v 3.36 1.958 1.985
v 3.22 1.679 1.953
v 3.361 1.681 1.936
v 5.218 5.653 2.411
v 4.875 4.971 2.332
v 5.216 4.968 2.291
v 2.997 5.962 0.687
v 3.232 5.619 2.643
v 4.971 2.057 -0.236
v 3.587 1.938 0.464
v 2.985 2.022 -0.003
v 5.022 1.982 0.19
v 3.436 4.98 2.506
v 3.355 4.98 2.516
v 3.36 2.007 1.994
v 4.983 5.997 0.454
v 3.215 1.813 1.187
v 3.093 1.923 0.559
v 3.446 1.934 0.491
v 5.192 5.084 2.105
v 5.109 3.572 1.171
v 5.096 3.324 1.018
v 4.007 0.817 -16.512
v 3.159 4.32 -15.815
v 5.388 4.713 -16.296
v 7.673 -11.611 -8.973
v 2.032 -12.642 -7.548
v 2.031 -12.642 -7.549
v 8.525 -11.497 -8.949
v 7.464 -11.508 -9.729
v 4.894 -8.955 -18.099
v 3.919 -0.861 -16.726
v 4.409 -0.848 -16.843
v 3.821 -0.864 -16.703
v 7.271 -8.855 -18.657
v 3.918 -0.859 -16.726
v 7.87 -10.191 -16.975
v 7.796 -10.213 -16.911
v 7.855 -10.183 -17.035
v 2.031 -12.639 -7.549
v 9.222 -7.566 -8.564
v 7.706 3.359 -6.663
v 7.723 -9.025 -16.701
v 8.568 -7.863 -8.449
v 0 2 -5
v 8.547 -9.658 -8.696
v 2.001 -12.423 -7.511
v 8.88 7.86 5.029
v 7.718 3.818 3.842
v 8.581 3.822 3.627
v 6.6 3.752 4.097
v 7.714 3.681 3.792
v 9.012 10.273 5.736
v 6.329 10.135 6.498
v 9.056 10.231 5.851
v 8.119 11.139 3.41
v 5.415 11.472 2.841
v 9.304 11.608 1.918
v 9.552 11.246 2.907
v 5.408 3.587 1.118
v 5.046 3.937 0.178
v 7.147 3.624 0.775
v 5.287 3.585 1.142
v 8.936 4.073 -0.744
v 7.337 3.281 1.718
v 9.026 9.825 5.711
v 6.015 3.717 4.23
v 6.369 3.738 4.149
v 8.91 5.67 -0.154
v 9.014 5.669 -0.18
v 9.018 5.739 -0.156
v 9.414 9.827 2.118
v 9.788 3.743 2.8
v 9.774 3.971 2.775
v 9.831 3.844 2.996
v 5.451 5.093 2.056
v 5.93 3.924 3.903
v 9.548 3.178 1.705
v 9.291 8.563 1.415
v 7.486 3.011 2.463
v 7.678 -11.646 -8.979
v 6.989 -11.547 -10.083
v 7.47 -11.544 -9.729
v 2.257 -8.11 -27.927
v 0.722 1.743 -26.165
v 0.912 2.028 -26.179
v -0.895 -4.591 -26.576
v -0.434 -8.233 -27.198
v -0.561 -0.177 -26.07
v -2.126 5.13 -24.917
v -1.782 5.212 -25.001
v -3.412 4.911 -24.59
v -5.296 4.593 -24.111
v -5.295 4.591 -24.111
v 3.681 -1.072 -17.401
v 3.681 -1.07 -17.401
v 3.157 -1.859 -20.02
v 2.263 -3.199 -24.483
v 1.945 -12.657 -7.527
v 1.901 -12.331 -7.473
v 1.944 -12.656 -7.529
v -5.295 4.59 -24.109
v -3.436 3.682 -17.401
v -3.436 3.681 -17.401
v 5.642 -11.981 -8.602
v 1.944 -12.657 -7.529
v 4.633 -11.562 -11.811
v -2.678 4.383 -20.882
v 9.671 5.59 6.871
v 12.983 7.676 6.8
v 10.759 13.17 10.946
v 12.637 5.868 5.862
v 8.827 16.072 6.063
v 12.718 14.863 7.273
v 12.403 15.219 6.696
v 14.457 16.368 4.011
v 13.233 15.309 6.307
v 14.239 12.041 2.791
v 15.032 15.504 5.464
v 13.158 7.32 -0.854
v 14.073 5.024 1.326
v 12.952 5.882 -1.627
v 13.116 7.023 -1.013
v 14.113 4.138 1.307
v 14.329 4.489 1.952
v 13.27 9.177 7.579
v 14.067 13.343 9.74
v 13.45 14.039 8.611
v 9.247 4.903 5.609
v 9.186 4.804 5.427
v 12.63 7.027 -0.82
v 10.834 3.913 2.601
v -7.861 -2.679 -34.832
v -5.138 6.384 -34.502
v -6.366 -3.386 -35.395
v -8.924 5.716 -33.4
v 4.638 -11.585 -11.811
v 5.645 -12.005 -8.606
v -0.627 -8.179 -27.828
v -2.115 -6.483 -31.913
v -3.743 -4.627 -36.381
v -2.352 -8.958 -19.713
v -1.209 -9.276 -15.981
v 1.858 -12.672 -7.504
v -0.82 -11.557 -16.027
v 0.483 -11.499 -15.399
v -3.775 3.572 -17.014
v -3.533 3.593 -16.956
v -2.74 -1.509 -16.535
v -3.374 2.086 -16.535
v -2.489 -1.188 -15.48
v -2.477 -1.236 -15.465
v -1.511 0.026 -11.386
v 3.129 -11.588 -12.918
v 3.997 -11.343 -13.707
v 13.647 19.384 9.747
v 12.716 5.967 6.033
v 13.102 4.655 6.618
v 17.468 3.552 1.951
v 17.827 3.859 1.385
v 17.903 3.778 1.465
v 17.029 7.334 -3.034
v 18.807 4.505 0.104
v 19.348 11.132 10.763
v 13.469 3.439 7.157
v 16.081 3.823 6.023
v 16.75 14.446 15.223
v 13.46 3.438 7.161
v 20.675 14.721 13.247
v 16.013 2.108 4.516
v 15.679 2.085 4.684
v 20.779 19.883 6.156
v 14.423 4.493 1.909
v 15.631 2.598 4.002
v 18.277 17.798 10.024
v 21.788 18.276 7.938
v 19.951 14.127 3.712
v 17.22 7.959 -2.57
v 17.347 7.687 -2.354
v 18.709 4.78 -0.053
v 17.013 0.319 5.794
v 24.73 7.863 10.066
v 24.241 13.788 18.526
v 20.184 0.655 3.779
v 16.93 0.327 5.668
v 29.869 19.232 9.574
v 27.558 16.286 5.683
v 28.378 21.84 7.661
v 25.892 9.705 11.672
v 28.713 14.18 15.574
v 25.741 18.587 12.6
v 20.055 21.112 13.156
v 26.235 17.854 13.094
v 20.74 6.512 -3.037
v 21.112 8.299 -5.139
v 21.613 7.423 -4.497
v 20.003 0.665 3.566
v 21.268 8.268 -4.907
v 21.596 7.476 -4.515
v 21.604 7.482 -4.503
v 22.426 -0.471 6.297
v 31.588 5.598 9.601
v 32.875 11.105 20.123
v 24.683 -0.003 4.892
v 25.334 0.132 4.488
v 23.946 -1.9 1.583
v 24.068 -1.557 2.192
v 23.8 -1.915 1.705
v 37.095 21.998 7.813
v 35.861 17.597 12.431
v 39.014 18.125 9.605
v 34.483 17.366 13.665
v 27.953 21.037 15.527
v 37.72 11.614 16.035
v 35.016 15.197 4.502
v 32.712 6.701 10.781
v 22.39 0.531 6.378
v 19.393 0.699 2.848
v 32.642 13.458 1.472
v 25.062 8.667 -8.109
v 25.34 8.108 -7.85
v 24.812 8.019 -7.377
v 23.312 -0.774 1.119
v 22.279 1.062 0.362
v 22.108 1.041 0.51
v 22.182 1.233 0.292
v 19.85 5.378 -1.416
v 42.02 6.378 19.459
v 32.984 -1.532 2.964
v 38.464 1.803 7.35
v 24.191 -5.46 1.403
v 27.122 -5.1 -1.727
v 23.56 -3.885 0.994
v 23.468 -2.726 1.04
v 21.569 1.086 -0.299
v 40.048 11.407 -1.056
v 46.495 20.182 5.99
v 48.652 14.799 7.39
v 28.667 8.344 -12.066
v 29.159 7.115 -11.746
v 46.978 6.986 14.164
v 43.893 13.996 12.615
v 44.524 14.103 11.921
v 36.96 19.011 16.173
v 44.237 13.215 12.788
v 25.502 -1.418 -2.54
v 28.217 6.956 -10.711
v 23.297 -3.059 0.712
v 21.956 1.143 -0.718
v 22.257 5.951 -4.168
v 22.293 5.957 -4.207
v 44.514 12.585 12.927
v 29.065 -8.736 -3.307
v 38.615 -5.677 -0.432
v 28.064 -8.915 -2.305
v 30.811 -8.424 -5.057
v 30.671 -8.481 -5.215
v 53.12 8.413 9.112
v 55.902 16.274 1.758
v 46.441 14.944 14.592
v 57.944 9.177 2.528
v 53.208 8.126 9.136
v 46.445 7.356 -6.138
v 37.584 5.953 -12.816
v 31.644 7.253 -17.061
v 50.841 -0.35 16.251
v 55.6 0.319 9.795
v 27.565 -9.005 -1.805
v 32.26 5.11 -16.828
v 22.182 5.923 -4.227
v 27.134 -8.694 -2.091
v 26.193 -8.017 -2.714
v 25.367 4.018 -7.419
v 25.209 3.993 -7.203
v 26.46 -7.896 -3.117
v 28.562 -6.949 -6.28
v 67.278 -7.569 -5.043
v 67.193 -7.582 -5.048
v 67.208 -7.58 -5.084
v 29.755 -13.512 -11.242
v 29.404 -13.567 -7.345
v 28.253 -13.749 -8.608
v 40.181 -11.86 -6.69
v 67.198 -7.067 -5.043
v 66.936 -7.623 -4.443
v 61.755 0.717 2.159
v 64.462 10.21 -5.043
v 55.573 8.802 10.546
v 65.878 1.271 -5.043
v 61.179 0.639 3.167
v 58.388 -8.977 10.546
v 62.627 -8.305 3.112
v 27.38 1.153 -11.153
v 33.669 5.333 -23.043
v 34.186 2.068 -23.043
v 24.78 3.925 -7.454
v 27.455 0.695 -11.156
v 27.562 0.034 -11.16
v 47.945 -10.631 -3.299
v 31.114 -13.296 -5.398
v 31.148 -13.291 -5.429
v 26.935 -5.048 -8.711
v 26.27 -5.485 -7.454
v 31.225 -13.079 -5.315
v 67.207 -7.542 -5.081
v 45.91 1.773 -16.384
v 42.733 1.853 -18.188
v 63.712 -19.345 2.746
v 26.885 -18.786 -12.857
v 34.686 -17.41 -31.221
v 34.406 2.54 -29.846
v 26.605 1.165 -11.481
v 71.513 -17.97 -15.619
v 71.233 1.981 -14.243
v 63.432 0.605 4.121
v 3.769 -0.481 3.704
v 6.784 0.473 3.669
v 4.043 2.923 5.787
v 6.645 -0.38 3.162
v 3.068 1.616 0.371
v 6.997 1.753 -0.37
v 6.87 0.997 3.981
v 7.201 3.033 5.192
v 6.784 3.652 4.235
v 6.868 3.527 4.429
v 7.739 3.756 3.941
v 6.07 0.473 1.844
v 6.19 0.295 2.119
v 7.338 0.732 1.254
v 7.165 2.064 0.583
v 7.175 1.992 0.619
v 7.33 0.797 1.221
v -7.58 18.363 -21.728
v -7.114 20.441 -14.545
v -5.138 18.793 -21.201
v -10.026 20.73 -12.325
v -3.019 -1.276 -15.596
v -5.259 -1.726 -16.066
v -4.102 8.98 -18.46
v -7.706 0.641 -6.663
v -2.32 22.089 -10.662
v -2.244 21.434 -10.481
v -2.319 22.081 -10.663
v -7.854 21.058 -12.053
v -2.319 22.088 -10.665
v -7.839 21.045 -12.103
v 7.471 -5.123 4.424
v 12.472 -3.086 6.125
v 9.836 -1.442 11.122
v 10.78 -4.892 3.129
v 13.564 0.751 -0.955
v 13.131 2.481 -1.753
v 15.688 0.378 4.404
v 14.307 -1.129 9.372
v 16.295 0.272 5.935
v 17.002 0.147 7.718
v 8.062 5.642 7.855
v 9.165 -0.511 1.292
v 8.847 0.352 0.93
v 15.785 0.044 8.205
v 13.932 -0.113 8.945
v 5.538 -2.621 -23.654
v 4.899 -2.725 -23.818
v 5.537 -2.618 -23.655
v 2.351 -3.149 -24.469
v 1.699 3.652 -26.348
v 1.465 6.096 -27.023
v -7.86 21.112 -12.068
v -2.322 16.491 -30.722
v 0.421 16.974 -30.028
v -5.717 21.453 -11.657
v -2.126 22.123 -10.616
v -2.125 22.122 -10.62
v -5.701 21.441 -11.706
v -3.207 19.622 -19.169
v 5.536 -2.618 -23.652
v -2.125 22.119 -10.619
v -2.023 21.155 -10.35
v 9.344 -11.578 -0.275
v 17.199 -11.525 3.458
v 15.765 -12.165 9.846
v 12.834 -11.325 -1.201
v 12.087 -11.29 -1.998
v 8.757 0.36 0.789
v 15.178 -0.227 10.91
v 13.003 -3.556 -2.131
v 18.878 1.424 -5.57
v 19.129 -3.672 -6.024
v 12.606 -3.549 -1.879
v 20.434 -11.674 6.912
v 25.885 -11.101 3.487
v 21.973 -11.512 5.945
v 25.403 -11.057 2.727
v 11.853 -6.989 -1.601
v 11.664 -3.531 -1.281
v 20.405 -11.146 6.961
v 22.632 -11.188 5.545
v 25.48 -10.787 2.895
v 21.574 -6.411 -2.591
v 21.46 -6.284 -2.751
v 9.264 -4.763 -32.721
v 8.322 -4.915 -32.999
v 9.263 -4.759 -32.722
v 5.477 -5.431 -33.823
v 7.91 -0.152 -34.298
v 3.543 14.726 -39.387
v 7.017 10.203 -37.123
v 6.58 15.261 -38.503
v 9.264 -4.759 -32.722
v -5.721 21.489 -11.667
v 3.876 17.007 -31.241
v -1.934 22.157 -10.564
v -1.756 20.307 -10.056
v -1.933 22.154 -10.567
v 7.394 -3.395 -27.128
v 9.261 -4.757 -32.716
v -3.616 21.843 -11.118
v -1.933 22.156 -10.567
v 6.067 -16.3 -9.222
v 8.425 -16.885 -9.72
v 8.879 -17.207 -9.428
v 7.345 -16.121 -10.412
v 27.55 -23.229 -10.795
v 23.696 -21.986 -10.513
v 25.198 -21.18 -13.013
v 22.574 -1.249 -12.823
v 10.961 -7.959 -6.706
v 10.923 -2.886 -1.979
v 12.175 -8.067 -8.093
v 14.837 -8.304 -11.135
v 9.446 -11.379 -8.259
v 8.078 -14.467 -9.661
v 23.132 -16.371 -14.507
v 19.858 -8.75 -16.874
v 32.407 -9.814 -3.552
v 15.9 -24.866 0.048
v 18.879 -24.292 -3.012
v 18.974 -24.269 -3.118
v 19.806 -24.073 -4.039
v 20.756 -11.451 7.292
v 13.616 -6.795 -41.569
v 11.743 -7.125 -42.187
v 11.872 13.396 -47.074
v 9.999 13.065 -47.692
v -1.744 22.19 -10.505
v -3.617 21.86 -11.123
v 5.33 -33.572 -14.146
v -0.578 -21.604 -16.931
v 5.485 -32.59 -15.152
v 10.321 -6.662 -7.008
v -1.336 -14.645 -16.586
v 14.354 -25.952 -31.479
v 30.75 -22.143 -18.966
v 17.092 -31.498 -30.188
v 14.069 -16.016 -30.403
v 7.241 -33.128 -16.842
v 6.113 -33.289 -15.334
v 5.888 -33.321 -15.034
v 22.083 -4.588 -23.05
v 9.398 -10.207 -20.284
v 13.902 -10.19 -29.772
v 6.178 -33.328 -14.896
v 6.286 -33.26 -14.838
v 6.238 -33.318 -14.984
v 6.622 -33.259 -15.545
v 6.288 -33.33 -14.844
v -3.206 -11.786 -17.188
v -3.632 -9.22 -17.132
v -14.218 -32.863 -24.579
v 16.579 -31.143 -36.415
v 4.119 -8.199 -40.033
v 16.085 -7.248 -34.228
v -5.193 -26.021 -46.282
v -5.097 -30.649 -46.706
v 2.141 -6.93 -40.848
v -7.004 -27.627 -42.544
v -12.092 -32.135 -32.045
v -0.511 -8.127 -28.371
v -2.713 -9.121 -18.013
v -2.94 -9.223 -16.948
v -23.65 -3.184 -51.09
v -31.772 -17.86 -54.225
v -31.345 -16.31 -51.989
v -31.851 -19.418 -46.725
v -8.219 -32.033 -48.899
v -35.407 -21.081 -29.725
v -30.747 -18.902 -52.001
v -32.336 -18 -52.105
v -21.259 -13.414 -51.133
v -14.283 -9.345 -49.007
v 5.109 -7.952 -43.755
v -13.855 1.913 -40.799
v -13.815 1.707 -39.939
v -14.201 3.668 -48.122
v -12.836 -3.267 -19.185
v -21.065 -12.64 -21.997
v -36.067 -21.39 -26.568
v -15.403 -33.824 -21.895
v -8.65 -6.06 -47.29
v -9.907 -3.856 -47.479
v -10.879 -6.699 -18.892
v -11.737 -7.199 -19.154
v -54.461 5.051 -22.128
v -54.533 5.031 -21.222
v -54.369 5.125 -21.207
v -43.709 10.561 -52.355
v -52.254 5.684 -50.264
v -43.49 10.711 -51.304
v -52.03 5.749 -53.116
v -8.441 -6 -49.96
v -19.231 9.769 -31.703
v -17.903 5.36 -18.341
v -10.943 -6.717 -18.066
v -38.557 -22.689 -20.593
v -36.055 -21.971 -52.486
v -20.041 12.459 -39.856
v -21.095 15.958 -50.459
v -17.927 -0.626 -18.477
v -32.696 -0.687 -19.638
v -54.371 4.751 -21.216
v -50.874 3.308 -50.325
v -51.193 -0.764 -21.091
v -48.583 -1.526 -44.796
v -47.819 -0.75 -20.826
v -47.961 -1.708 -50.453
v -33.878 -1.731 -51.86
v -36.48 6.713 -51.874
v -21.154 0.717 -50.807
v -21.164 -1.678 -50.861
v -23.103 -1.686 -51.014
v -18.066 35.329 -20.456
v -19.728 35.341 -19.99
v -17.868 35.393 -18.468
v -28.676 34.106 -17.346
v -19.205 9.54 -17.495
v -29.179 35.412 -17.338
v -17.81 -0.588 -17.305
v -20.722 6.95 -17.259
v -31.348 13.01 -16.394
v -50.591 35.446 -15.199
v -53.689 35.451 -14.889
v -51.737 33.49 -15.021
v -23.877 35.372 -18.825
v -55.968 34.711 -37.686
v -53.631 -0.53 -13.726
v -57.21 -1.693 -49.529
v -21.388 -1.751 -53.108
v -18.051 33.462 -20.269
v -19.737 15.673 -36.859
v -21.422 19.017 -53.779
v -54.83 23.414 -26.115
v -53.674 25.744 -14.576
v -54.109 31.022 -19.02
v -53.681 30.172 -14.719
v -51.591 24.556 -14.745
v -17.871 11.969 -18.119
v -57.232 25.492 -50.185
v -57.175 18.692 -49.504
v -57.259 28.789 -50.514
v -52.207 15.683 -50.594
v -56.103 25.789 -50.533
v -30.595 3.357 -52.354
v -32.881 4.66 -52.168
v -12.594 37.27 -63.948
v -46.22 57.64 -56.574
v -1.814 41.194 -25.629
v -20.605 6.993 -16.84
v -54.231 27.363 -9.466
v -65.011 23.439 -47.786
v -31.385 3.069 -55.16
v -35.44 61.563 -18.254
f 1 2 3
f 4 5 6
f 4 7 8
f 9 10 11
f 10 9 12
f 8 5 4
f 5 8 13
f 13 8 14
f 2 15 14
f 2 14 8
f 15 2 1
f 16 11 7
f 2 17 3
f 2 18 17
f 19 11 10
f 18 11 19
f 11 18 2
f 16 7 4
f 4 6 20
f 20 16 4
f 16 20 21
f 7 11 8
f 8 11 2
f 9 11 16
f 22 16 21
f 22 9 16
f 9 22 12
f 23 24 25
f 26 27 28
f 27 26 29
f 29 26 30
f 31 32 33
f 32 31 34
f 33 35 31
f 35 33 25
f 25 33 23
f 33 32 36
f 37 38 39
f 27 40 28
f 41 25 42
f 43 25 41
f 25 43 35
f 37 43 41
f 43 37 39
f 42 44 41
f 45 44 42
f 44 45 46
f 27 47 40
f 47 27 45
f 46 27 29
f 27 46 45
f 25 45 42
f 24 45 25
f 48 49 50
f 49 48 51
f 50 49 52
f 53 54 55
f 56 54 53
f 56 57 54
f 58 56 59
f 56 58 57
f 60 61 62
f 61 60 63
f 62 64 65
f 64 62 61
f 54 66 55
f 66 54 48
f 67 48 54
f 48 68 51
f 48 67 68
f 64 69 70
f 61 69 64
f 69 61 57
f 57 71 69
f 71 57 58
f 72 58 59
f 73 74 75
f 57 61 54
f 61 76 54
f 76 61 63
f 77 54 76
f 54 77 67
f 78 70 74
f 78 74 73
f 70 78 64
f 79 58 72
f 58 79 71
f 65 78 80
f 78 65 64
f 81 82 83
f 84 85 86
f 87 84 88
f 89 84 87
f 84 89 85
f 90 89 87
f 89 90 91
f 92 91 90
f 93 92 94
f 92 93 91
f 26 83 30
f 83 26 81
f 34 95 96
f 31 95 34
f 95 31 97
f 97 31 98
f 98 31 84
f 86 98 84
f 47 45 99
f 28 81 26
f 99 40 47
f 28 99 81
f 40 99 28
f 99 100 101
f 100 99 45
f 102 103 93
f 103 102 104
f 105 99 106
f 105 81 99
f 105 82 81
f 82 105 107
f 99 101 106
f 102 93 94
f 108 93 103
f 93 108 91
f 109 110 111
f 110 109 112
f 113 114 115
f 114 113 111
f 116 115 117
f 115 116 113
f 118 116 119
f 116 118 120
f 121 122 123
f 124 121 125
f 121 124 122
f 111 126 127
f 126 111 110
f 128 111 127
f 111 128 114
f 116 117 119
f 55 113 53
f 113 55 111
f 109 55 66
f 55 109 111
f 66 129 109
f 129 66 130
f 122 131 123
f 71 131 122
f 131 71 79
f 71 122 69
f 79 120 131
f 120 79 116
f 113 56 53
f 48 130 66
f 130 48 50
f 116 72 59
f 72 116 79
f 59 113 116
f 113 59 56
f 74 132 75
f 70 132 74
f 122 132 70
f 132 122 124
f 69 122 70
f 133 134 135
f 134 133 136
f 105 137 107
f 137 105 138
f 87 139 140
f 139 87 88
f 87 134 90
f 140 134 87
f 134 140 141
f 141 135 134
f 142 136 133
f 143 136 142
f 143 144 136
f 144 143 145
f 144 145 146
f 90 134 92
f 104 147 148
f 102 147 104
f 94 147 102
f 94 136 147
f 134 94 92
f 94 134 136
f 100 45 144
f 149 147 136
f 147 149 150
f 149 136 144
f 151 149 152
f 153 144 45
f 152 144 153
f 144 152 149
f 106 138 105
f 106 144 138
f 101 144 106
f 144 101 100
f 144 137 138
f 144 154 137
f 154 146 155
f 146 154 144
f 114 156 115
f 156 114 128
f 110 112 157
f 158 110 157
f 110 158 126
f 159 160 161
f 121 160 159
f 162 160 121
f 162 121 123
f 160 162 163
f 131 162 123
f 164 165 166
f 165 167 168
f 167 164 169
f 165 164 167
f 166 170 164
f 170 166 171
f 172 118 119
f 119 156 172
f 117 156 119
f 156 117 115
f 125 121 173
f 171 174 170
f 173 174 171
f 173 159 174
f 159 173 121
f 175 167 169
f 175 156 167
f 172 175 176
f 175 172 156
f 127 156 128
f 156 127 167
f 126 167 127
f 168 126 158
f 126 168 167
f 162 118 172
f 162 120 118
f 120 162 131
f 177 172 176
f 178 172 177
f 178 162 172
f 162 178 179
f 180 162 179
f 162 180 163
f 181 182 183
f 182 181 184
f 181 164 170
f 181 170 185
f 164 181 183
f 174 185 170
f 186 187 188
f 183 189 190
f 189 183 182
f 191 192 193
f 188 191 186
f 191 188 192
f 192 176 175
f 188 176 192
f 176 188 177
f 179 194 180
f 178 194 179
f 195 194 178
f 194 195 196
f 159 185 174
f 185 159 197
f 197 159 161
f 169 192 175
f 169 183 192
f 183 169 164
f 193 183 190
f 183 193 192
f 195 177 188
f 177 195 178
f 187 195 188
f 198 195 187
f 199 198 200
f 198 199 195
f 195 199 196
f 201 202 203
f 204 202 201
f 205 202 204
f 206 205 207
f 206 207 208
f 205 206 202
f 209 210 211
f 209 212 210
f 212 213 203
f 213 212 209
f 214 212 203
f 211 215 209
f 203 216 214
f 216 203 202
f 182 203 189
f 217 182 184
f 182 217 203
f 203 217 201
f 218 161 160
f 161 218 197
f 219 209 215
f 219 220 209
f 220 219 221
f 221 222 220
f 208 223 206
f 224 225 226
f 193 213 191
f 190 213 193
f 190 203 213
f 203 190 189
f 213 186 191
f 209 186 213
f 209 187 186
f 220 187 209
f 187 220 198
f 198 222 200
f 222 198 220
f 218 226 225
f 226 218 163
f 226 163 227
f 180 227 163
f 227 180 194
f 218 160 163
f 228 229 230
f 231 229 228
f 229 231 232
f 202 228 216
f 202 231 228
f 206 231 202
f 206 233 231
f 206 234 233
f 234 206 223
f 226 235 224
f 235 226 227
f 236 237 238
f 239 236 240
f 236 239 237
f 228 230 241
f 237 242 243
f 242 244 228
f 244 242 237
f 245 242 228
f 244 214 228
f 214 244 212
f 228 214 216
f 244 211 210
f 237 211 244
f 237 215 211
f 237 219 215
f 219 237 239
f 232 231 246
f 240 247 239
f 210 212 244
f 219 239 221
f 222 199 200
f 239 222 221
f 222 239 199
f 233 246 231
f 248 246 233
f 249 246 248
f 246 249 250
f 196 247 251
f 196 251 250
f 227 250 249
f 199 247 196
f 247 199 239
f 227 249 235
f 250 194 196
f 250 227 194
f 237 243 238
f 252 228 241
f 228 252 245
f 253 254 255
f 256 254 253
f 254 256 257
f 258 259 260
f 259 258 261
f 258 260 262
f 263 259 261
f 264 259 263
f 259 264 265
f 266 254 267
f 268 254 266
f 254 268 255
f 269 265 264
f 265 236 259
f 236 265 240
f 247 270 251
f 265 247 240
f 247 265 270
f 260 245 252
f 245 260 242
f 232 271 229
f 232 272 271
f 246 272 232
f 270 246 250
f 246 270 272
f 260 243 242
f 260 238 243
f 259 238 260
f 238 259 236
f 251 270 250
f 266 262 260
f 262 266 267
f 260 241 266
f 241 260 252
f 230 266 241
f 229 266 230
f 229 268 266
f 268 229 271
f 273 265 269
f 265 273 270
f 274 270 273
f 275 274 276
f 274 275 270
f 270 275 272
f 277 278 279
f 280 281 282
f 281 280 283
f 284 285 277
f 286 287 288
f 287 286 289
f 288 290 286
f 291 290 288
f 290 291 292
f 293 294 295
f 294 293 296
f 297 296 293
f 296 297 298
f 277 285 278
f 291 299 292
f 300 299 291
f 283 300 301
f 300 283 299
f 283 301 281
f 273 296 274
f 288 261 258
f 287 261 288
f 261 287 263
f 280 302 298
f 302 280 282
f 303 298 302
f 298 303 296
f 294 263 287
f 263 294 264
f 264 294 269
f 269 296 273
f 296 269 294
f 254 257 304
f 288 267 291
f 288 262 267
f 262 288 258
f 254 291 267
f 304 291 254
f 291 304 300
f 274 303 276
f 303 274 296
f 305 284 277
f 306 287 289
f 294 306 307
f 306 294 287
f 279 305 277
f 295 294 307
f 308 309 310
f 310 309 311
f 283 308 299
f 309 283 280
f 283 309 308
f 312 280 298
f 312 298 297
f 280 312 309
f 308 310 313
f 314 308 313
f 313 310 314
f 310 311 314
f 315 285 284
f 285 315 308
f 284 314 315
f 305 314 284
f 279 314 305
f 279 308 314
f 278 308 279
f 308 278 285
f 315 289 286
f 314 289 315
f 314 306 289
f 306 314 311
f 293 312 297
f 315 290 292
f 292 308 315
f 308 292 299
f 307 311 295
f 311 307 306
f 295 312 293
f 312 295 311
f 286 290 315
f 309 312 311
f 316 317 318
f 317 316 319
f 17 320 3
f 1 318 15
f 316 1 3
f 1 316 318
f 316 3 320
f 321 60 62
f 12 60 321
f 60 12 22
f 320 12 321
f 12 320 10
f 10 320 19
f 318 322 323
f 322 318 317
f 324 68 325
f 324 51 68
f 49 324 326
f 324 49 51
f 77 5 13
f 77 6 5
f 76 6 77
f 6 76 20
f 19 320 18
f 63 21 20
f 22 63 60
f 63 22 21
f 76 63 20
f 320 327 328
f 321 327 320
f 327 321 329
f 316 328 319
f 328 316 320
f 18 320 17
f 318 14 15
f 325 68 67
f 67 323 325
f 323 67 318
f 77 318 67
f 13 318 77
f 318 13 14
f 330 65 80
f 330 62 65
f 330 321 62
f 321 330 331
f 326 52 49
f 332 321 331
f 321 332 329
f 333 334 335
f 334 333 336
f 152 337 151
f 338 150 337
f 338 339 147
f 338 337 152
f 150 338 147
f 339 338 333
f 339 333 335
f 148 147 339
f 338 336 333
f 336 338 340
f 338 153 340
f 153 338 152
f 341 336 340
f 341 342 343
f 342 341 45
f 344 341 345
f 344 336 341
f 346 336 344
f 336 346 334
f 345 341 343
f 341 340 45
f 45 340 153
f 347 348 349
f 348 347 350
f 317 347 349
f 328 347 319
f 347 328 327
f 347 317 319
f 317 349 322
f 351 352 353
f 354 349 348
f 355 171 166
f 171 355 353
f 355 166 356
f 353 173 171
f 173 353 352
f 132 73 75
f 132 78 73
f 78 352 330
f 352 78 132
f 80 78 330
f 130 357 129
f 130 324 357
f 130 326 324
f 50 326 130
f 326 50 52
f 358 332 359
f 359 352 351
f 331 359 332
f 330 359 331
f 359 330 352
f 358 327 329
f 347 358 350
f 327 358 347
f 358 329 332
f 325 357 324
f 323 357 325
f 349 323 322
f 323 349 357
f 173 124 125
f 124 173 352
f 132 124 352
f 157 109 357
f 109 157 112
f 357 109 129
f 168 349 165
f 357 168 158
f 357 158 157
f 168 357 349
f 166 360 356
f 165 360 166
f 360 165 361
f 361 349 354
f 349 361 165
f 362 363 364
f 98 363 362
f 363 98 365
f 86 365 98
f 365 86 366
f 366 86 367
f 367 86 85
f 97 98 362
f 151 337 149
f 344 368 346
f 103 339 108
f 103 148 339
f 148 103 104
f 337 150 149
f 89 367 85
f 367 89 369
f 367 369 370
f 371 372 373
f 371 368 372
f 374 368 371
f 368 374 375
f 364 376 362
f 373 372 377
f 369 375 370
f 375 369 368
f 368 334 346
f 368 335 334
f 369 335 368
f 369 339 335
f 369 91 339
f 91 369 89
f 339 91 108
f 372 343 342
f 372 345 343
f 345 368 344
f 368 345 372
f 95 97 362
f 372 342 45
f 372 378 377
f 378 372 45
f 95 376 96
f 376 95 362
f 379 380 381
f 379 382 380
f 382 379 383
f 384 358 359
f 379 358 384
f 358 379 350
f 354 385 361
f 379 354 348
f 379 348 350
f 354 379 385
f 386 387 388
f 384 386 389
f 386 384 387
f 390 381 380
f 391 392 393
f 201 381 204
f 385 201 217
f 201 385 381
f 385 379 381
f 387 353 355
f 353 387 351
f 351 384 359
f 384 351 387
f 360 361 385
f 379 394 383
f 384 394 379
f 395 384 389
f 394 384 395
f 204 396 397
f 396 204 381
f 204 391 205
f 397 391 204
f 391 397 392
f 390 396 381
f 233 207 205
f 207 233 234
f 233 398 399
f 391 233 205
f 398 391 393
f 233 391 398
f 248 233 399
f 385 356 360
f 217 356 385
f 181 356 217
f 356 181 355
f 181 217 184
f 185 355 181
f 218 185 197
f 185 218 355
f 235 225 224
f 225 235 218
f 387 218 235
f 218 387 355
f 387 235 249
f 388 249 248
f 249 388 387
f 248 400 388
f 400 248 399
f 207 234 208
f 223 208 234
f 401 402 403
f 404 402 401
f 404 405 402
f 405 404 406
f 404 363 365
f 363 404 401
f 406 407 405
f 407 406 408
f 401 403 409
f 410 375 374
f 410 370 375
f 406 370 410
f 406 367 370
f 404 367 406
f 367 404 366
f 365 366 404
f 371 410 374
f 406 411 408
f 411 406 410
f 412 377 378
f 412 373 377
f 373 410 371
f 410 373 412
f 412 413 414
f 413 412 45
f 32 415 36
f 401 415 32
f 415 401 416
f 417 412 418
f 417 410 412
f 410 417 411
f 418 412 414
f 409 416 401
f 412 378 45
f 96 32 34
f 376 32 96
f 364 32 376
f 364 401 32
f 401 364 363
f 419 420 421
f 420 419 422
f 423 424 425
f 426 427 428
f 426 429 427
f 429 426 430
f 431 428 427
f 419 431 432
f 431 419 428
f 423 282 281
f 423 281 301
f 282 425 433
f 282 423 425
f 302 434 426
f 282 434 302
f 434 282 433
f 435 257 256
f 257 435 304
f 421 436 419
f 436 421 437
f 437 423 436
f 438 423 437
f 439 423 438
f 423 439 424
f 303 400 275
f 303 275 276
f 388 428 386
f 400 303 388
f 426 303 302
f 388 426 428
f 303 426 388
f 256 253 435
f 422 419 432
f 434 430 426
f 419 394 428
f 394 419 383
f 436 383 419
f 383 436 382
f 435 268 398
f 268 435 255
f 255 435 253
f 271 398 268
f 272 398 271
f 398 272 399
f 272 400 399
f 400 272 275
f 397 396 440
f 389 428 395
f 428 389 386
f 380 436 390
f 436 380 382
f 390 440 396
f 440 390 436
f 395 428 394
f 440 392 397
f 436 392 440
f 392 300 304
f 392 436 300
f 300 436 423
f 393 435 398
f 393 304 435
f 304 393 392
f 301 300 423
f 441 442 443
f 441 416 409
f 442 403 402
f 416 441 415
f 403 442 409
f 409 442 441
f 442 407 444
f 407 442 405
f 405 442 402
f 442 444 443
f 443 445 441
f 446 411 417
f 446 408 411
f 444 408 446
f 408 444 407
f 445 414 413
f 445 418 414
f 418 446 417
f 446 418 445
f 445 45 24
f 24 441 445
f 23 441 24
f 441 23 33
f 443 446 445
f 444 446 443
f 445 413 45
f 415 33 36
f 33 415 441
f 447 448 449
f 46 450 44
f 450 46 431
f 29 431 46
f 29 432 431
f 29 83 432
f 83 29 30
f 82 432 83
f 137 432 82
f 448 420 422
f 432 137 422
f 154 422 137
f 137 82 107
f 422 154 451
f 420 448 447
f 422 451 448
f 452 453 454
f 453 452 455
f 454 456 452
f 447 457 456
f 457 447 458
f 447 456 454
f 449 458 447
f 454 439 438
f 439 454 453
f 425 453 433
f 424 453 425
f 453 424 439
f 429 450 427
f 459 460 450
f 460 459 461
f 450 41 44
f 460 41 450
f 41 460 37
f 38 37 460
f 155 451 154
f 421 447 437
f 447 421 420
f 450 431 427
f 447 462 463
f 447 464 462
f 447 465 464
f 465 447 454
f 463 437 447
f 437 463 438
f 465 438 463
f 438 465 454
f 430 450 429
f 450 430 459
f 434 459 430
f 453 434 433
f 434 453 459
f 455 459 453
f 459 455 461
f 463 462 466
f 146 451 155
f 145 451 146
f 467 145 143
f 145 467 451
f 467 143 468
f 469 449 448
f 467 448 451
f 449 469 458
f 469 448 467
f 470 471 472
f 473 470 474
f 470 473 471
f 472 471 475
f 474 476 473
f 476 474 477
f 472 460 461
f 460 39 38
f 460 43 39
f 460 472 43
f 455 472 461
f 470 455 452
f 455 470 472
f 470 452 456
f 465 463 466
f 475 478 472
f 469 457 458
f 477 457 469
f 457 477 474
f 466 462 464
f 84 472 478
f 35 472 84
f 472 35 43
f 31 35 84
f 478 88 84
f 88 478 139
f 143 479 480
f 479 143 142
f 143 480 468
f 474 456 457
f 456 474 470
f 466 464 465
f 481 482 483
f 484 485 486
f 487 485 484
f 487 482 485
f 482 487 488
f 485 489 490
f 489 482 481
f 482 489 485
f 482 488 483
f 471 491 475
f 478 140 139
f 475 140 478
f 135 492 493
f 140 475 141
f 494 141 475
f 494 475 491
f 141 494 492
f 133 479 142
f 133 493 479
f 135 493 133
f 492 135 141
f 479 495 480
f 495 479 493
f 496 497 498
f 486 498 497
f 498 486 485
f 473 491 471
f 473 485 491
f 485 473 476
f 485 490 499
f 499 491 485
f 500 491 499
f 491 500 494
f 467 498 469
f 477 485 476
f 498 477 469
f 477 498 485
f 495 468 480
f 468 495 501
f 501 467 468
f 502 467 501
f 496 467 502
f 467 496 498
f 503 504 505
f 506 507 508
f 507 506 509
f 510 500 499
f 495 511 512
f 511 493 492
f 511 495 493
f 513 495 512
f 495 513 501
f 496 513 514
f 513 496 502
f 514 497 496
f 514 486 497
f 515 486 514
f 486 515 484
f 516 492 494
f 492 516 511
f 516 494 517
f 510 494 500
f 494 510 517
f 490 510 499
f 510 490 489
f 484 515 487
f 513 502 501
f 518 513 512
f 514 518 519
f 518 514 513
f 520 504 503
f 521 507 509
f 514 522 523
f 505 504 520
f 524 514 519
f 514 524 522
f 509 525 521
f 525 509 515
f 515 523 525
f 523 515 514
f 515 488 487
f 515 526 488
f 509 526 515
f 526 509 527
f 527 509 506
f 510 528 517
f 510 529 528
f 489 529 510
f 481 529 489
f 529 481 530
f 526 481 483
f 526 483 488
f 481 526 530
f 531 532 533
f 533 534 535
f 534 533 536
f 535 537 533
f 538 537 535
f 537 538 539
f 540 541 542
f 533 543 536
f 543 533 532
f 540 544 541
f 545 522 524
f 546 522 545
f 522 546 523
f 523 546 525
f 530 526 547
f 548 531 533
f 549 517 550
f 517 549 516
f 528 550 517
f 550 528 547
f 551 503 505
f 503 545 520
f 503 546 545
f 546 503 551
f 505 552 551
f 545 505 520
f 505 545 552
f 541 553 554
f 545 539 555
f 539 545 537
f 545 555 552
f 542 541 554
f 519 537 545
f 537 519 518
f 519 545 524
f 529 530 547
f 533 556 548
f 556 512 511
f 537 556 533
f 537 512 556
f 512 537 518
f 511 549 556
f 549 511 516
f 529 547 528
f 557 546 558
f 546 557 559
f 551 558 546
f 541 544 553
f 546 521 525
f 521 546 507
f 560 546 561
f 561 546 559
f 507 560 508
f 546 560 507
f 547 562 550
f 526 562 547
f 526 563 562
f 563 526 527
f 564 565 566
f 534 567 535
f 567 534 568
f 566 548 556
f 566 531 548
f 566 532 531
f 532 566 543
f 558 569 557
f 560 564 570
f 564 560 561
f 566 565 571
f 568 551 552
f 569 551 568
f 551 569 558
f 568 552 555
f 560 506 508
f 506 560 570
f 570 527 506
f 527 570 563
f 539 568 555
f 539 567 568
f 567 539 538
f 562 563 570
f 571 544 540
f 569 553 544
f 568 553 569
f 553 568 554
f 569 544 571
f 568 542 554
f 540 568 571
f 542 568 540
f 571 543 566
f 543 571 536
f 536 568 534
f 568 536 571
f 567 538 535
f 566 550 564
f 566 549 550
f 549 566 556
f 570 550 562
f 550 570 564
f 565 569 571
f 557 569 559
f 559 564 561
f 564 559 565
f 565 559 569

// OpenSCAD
/*
  sorry i lost the source for the actual
  model, this is where the start came from.
*/
for (y = [10 : 6 : 20]) {
  for (x = [0 : 2 : 20]) {
    if ( y % 4 != 0) {
      rotate([x*y/2,y*x/3,x/2])
        translate([x+1,y*x/10,0])
        cube([x,x + (x*y*0.1),x]);
    } else {
      rotate([x*y,y*x/3,x])
        translate([x+1,y*x/18,0])
        cube([x*2,x*2,x*2]);
    }
    union() {
      if (2/x*y*y/30 > 1) {
        translate([0,2,-5])
          rotate([y,70-(x)+100,90*y+10])
          cube([10-x,5+y,x*5]);
      }
    }
  }
}
